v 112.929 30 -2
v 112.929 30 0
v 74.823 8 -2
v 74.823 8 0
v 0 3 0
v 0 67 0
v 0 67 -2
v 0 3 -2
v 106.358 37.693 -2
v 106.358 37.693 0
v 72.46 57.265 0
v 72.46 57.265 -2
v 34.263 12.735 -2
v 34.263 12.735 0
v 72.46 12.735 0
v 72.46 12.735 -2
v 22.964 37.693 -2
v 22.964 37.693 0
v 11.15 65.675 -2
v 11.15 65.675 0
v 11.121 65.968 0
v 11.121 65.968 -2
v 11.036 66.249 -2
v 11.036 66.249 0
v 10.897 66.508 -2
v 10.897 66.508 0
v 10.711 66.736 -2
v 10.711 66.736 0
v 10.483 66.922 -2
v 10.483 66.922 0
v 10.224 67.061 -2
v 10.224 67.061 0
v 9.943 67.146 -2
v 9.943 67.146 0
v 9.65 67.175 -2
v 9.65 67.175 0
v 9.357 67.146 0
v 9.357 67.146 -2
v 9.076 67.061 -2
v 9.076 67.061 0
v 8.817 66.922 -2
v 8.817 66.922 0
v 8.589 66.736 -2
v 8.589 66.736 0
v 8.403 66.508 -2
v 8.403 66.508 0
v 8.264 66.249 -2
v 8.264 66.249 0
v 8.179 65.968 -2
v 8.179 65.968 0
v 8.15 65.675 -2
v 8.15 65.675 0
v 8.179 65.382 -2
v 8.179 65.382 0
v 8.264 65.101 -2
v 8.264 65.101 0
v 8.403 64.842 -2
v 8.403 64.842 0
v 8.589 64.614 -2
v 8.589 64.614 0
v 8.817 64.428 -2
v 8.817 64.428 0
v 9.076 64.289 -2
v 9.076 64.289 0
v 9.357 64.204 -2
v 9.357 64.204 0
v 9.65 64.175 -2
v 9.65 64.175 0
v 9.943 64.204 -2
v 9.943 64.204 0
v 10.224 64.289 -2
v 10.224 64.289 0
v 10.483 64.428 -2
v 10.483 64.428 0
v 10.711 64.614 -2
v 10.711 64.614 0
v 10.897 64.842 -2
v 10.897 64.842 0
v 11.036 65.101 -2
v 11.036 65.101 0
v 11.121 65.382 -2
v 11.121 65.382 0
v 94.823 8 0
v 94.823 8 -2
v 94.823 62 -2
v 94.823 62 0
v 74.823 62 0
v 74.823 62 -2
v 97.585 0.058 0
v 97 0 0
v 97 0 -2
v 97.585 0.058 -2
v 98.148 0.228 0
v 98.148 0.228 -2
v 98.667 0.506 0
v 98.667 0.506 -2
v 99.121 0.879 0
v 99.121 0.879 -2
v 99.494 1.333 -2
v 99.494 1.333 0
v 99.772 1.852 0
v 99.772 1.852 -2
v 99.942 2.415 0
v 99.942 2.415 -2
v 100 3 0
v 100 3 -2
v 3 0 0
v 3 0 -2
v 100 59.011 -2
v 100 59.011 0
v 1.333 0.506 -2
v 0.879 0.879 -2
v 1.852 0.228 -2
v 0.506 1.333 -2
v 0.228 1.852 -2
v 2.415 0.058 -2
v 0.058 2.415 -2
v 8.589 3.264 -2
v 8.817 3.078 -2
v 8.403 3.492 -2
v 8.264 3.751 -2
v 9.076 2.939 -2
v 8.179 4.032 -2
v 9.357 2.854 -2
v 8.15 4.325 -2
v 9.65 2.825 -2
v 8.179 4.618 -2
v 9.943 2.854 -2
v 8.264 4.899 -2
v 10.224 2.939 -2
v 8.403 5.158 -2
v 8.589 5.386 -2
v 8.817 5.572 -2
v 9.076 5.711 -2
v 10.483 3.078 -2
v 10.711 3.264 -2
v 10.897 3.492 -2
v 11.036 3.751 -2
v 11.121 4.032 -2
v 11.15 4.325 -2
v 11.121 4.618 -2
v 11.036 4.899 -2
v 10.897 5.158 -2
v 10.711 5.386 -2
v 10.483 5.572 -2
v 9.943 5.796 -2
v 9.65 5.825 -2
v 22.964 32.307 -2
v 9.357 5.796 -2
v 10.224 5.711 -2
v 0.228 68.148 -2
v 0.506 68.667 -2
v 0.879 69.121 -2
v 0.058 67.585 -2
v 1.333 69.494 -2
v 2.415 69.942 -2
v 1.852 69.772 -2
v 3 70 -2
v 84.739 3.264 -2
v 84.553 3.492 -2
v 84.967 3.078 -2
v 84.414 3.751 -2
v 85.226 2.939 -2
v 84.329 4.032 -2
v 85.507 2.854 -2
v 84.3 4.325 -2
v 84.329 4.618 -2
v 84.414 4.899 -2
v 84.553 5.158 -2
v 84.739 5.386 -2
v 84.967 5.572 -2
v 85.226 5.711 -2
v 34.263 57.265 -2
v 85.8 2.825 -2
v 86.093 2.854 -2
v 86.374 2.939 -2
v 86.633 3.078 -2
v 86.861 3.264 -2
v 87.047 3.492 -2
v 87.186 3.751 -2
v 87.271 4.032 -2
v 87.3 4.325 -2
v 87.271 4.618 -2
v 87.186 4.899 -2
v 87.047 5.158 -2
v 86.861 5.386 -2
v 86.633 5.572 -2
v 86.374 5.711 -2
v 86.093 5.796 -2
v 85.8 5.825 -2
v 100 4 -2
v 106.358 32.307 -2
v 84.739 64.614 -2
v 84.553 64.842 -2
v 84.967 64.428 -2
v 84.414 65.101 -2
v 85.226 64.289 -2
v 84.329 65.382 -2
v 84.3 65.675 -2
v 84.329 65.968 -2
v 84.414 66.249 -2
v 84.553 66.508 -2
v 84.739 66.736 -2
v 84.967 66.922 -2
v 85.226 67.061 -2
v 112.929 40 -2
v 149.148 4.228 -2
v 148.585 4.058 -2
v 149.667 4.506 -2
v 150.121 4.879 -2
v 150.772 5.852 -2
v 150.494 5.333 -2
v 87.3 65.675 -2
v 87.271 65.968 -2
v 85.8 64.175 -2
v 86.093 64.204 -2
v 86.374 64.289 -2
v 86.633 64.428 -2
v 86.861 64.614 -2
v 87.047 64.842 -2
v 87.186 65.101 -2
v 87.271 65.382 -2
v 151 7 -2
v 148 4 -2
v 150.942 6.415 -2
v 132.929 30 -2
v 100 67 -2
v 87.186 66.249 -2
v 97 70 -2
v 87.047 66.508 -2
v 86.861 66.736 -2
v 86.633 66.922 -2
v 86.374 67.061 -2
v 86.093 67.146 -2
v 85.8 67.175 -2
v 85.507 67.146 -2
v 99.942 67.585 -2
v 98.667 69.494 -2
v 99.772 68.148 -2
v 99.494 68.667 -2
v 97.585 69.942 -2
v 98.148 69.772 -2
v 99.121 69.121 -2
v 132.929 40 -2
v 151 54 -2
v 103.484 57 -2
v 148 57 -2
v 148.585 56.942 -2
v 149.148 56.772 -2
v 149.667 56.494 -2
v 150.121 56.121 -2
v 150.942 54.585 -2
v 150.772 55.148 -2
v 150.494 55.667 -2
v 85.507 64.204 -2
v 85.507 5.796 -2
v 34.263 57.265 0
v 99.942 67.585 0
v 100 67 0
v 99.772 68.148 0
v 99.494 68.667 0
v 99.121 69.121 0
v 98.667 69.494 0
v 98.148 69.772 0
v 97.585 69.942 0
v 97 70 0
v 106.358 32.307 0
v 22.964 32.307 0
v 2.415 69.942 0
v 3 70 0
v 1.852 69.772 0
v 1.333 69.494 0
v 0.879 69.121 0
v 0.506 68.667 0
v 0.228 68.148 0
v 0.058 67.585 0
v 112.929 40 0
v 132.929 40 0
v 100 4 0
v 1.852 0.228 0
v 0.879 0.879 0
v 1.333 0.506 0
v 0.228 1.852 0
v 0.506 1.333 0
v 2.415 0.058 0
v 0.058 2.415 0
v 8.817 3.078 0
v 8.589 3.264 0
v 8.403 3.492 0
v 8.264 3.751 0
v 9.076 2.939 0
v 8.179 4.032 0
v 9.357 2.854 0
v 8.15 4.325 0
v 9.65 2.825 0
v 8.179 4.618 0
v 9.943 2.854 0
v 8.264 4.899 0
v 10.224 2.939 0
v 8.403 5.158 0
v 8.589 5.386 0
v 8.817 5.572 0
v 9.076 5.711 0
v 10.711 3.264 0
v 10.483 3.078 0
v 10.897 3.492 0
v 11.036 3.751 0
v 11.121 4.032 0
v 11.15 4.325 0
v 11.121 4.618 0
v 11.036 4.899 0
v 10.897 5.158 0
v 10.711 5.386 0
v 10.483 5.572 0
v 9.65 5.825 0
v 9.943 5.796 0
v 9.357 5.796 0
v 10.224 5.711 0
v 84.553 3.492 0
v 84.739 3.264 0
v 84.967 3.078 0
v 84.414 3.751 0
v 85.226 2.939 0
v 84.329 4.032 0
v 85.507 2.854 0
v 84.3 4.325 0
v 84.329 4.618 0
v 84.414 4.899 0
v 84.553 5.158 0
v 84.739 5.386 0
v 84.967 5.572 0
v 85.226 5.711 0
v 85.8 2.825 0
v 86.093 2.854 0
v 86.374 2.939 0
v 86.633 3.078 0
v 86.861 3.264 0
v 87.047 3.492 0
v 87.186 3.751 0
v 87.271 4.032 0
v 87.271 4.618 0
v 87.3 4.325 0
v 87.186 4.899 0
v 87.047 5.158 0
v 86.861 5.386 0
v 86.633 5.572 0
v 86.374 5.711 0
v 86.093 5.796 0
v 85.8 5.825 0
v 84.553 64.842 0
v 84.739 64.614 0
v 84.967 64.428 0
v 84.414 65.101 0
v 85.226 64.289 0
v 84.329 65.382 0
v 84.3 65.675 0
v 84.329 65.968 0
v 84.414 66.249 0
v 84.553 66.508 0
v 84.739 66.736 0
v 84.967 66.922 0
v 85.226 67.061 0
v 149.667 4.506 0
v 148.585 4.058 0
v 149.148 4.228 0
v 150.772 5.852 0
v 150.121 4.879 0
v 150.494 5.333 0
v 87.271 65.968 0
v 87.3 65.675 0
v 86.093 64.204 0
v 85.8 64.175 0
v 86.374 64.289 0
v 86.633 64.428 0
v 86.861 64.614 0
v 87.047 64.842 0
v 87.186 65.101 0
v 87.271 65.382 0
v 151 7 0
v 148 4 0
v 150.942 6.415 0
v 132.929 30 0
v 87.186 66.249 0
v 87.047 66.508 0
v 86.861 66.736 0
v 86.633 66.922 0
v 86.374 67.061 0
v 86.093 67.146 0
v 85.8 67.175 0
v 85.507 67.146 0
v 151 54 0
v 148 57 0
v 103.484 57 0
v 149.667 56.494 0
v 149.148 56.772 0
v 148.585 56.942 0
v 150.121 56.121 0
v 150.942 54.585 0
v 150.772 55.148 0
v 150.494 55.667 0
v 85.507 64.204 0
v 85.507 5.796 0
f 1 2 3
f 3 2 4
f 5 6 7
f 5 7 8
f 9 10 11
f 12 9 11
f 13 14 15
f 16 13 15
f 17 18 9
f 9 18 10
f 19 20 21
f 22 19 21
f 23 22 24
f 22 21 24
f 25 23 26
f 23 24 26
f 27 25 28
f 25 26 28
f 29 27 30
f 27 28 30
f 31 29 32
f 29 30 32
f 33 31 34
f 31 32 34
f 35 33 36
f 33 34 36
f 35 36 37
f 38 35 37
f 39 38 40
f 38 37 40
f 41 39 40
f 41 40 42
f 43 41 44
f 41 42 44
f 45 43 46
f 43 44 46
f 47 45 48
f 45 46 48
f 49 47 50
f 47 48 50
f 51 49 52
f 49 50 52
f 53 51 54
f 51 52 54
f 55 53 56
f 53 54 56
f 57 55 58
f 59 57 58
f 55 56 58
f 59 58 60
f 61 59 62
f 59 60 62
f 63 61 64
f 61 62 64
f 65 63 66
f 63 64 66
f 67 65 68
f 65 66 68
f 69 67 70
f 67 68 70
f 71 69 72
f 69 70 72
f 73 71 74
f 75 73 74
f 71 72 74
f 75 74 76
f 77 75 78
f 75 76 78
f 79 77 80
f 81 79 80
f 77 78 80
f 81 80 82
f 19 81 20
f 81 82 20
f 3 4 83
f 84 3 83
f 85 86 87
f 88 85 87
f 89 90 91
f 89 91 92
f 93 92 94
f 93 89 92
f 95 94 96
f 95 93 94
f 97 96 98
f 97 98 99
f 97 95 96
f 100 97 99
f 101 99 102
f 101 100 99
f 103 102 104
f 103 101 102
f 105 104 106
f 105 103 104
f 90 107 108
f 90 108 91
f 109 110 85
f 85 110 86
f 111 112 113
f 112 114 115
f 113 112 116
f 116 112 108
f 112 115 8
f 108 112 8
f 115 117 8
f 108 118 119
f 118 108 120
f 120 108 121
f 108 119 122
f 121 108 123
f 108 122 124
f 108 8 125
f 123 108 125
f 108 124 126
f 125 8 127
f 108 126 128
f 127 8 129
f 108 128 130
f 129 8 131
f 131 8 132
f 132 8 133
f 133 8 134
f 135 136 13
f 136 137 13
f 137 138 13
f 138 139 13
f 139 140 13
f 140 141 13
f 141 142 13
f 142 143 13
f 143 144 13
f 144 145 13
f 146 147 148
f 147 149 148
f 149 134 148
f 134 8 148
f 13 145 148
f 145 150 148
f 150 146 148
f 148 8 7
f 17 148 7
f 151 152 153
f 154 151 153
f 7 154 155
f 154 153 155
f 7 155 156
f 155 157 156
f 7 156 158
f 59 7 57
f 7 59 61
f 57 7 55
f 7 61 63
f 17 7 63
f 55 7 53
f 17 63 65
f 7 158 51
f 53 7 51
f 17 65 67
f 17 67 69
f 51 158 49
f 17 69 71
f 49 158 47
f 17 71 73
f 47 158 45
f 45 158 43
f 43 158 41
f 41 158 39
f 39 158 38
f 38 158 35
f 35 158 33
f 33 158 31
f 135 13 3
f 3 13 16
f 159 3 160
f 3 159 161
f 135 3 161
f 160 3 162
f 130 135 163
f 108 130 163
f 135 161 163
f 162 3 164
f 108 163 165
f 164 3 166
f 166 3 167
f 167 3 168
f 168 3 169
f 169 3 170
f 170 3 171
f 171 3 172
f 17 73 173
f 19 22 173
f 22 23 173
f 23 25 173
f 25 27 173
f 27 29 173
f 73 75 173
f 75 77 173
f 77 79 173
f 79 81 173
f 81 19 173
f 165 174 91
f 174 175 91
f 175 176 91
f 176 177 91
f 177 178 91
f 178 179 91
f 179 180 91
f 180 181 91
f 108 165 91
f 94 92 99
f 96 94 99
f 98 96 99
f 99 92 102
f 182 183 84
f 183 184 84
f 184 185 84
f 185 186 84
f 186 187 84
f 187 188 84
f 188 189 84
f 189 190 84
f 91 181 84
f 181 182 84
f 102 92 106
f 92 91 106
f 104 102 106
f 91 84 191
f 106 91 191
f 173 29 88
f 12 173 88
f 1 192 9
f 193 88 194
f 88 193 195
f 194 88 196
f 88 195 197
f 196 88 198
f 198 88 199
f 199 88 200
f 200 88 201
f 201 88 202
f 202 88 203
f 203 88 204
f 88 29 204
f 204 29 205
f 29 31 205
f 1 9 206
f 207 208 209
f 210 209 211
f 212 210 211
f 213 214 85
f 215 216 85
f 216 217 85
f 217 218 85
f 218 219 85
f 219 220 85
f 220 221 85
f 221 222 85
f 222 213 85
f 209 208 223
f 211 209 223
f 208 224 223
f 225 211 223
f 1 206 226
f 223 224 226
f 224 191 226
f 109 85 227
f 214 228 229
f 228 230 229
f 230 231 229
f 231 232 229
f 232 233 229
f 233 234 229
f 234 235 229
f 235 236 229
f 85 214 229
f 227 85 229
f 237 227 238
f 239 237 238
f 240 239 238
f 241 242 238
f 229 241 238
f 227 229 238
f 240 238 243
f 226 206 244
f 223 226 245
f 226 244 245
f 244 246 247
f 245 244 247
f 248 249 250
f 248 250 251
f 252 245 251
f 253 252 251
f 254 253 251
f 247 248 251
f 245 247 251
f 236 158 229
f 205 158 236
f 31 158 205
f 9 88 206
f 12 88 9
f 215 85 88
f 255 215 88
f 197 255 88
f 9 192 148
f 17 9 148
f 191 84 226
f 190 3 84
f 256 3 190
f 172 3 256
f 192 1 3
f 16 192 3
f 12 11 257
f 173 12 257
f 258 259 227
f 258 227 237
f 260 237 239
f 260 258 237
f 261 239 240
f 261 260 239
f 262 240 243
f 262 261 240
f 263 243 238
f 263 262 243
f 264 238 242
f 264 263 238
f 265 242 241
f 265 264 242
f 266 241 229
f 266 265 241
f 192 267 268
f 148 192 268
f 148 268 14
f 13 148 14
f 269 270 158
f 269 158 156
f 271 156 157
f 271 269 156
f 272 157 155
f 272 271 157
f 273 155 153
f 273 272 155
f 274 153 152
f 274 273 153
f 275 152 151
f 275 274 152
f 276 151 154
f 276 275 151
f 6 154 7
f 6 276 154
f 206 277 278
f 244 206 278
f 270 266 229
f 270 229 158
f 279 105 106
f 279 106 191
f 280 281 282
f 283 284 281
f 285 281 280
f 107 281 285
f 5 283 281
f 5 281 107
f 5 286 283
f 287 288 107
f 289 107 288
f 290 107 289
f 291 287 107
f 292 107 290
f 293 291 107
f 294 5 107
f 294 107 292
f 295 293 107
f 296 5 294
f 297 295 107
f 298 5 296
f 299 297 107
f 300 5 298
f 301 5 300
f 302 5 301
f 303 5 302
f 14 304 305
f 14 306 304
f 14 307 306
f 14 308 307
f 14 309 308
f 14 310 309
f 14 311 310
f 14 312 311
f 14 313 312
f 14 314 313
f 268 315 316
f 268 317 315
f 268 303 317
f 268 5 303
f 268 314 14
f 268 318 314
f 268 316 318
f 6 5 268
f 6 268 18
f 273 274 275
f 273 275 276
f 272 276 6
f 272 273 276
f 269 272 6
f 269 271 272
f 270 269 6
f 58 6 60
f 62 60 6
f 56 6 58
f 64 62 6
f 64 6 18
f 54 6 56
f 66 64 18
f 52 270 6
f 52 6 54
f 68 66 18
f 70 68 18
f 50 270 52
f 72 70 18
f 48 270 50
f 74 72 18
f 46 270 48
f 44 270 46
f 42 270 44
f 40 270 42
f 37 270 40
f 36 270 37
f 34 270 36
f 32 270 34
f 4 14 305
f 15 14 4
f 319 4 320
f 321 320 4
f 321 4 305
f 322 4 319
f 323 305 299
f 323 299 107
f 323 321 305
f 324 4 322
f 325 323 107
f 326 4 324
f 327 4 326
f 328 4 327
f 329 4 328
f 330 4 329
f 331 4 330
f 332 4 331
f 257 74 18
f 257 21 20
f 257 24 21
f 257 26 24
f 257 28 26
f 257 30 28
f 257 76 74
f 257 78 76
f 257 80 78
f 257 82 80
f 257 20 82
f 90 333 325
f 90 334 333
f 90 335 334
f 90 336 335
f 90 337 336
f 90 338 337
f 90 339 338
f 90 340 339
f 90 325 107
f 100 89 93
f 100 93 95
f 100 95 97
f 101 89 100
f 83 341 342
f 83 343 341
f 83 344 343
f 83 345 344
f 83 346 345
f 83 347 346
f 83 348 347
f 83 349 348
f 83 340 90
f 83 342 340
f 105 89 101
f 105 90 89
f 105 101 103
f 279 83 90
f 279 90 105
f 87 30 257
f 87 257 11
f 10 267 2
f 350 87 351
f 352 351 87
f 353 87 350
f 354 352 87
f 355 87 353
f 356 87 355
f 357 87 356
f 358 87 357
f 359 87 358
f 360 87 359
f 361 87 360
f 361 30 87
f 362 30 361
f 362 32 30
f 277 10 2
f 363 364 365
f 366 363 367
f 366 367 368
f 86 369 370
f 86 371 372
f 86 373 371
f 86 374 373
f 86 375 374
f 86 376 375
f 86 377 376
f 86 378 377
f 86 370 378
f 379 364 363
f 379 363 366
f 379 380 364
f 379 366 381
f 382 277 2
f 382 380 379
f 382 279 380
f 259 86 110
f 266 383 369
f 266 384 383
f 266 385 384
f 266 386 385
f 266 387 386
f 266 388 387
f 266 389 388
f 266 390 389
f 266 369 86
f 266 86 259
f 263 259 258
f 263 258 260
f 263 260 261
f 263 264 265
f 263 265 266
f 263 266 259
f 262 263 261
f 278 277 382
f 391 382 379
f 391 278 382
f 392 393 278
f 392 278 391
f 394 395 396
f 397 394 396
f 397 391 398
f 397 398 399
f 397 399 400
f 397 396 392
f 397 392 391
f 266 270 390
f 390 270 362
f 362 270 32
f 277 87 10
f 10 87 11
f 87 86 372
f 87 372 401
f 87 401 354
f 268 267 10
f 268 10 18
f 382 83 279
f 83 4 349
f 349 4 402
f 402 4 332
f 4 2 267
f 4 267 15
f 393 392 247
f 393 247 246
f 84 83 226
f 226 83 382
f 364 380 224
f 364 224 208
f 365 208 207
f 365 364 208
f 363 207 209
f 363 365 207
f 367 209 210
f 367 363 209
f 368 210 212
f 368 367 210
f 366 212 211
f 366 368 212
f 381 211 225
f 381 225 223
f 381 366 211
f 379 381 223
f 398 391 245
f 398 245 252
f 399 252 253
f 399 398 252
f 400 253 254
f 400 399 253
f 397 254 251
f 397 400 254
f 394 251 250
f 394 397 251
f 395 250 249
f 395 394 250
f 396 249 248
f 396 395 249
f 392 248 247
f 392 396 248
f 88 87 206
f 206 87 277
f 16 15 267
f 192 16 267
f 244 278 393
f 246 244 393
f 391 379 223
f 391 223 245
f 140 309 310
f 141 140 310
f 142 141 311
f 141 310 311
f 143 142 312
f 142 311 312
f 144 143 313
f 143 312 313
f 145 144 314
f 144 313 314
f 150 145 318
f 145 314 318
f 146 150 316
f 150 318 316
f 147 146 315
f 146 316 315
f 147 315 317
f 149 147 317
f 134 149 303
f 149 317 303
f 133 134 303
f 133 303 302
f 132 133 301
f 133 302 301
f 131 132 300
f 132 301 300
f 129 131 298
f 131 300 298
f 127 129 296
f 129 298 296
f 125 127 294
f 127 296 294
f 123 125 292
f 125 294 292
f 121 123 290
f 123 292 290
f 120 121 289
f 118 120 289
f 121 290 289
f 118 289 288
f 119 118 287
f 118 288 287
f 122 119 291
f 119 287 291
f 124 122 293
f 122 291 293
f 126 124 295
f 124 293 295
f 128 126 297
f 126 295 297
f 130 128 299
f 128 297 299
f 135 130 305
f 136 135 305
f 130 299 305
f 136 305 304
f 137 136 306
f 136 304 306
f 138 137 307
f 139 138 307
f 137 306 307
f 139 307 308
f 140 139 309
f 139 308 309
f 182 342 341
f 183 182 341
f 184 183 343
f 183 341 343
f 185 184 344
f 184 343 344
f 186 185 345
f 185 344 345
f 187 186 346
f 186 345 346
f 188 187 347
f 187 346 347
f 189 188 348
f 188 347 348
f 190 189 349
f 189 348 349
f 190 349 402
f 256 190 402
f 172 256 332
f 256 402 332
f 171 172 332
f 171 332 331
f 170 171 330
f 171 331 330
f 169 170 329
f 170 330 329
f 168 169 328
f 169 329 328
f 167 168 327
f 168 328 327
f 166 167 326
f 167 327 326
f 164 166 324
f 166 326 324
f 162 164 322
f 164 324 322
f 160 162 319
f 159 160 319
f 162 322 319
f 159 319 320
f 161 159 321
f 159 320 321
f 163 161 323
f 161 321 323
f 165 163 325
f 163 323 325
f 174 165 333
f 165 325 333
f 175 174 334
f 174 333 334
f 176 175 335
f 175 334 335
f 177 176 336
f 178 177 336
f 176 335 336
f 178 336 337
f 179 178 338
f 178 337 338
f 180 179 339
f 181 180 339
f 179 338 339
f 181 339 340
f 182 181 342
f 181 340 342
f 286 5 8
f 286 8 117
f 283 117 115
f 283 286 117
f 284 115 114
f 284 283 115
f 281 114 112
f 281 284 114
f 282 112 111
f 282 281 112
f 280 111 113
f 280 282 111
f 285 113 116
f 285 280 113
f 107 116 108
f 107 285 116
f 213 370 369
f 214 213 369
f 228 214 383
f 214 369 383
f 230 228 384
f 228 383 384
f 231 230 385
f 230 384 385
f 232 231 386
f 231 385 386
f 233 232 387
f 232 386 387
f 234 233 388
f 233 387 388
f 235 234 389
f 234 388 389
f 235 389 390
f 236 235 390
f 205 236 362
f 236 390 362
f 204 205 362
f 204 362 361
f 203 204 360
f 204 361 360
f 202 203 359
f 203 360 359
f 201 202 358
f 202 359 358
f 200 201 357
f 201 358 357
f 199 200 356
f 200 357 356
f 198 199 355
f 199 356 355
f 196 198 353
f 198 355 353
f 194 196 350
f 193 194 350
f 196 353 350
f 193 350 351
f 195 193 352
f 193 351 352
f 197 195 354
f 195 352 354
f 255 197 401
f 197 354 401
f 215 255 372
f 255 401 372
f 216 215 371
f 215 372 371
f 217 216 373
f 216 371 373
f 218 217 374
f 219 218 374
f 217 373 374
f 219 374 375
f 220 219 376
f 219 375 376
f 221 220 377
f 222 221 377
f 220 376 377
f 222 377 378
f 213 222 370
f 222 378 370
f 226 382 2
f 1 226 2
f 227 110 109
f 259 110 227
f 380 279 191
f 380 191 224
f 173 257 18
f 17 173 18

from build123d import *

# Parameters (mm, degrees)
F0_R     = 1.5
F1_DEPTH = 2
F2_R     = 3
F2_R_2   = 1.5
F3_DEPTH = 2
F7_DEPTH = 2


with BuildPart() as f1:
    # F0 (on Top) → F1 (new body)
    with BuildSketch(Plane.XY):
        with BuildLine():
            Line((97, 70), (3, 70))
            ThreePointArc((3, 70), (0.87868, 69.12132), (0, 67))
            Line((0, 67), (0, 3))
            ThreePointArc((0, 3), (0.87868, 0.87868), (3, 0))
            Line((3, 0), (97, 0))
            ThreePointArc((97, 0), (99.12132, 0.87868), (100, 3))
            Line((100, 3), (100, 4))
            Line((100, 4), (148, 4))
            ThreePointArc((148, 4), (150.12132, 4.87868), (151, 7))
            Line((151, 7), (151, 54))
            ThreePointArc((151, 54), (150.12132, 56.12132), (148, 57))
            Line((148, 57), (100, 57))
            Line((100, 57), (100, 67))
            ThreePointArc((100, 67), (99.12132, 69.12132), (97, 70))
        make_face()
        with Locations((9.65, 4.325)):
            Circle(F0_R, mode=Mode.SUBTRACT)
        with Locations((85.8, 4.325)):
            Circle(F0_R, mode=Mode.SUBTRACT)
        with Locations((9.65, 65.675)):
            Circle(F0_R, mode=Mode.SUBTRACT)
        with Locations((85.8, 65.675)):
            Circle(F0_R, mode=Mode.SUBTRACT)
    extrude(amount=-F1_DEPTH)

    # F2 (on face) → F3 (join)
    with BuildSketch(Plane(origin=(0, 0, -2), x_dir=(1, 0, 0), z_dir=(0, 0, -1))):
        with Locations((9.65, -65.675)):
            Circle(F2_R)
        with Locations((9.65, -65.675)):
            Circle(F2_R_2, mode=Mode.SUBTRACT)
        with Locations((85.8, -65.675)):
            Circle(F2_R)
        with Locations((85.8, -65.675)):
            Circle(F2_R_2, mode=Mode.SUBTRACT)
        with Locations((9.65, -4.325)):
            Circle(F2_R)
        with Locations((9.65, -4.325)):
            Circle(F2_R_2, mode=Mode.SUBTRACT)
        with Locations((85.8, -4.325)):
            Circle(F2_R)
        with Locations((85.8, -4.325)):
            Circle(F2_R_2, mode=Mode.SUBTRACT)
    extrude(amount=-F3_DEPTH)

    # F6 (on Top) → F7 (cut)
    with BuildSketch(Plane.XY):
        Polygon((34.263368, 12.735125), (72.459799, 12.735125), (106.358428, 32.306507), (22.963825, 32.306507), align=None)
        Polygon((106.358428, 37.693493), (72.459799, 57.264875), (34.263368, 57.264875), (22.963825, 37.693493), align=None)
        Polygon((94.823405, 8), (132.928523, 30), (112.928523, 30), (74.823405, 8), align=None)
        Polygon((112.928523, 40), (132.928523, 40), (94.823405, 62), (74.823405, 62), align=None)
    extrude(amount=-F7_DEPTH, mode=Mode.SUBTRACT)


solid = f1.part
